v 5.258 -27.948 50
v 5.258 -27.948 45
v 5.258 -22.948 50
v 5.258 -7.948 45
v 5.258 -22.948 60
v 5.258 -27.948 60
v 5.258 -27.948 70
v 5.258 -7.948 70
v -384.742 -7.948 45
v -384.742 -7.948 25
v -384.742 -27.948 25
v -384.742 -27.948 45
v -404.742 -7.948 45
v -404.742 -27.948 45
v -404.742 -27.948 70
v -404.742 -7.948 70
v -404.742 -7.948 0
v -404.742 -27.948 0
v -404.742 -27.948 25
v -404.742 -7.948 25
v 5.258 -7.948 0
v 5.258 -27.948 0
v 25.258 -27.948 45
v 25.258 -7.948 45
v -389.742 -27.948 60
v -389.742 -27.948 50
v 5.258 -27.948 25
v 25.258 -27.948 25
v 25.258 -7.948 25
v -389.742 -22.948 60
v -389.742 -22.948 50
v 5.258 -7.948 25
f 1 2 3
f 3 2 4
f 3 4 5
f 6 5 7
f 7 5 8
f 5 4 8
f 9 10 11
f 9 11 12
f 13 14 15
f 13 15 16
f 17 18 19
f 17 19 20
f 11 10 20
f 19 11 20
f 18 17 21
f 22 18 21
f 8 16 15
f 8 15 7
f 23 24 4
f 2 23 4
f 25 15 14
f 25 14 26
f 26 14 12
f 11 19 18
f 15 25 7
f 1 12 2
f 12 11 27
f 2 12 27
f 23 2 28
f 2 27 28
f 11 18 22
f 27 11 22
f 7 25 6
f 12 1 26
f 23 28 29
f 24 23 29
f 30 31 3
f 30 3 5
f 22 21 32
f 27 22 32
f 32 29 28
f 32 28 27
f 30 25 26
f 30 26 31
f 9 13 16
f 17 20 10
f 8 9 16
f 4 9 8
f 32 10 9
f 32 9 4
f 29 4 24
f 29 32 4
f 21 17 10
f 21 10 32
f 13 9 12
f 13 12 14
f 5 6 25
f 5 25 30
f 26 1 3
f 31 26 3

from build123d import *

# Parameters (mm, degrees)
F0_W          = 430
F0_H          = 20
F1_DEPTH      = 70
F2_W          = 5
F2_H          = 10
F3_DEPTH      = 415
F3_DEPTH_BACK = 15
F4_W          = 20
F4_H          = 25
F4_H_2        = 20
F5_DEPTH      = 20.001


with BuildPart() as f1:
    # F0 (on Top) → F1 (new body)
    with BuildSketch(Plane.XY):
        with Locations((-189.742246, -17.948127)):
            Rectangle(F0_W, F0_H)
    extrude(amount=F1_DEPTH)

    # F2 (on face) → F3 (cut, two sides)
    with BuildSketch(Plane.YZ.offset(25.257754)) as f3_sk:
        with Locations((-25.448127, 55)):
            Rectangle(F2_W, F2_H)
    extrude(amount=-F3_DEPTH, mode=Mode.SUBTRACT)
    extrude(f3_sk.sketch, amount=-F3_DEPTH_BACK, mode=Mode.SUBTRACT)

    # F4 (on face) → F5 (cut, through all)
    with BuildSketch(Plane(origin=(0, -7.948127, 0), x_dir=(-1, 0, 0), z_dir=(0, 1, 0))):
        with Locations((-15.257754, 57.5)):
            Rectangle(F4_W, F4_H)
        with Locations((-15.257754, 12.5)):
            Rectangle(F4_W, F4_H)
        with Locations((394.742246, 35)):
            Rectangle(F4_W, F4_H_2)
    extrude(amount=-F5_DEPTH, mode=Mode.SUBTRACT)


solid = f1.part
